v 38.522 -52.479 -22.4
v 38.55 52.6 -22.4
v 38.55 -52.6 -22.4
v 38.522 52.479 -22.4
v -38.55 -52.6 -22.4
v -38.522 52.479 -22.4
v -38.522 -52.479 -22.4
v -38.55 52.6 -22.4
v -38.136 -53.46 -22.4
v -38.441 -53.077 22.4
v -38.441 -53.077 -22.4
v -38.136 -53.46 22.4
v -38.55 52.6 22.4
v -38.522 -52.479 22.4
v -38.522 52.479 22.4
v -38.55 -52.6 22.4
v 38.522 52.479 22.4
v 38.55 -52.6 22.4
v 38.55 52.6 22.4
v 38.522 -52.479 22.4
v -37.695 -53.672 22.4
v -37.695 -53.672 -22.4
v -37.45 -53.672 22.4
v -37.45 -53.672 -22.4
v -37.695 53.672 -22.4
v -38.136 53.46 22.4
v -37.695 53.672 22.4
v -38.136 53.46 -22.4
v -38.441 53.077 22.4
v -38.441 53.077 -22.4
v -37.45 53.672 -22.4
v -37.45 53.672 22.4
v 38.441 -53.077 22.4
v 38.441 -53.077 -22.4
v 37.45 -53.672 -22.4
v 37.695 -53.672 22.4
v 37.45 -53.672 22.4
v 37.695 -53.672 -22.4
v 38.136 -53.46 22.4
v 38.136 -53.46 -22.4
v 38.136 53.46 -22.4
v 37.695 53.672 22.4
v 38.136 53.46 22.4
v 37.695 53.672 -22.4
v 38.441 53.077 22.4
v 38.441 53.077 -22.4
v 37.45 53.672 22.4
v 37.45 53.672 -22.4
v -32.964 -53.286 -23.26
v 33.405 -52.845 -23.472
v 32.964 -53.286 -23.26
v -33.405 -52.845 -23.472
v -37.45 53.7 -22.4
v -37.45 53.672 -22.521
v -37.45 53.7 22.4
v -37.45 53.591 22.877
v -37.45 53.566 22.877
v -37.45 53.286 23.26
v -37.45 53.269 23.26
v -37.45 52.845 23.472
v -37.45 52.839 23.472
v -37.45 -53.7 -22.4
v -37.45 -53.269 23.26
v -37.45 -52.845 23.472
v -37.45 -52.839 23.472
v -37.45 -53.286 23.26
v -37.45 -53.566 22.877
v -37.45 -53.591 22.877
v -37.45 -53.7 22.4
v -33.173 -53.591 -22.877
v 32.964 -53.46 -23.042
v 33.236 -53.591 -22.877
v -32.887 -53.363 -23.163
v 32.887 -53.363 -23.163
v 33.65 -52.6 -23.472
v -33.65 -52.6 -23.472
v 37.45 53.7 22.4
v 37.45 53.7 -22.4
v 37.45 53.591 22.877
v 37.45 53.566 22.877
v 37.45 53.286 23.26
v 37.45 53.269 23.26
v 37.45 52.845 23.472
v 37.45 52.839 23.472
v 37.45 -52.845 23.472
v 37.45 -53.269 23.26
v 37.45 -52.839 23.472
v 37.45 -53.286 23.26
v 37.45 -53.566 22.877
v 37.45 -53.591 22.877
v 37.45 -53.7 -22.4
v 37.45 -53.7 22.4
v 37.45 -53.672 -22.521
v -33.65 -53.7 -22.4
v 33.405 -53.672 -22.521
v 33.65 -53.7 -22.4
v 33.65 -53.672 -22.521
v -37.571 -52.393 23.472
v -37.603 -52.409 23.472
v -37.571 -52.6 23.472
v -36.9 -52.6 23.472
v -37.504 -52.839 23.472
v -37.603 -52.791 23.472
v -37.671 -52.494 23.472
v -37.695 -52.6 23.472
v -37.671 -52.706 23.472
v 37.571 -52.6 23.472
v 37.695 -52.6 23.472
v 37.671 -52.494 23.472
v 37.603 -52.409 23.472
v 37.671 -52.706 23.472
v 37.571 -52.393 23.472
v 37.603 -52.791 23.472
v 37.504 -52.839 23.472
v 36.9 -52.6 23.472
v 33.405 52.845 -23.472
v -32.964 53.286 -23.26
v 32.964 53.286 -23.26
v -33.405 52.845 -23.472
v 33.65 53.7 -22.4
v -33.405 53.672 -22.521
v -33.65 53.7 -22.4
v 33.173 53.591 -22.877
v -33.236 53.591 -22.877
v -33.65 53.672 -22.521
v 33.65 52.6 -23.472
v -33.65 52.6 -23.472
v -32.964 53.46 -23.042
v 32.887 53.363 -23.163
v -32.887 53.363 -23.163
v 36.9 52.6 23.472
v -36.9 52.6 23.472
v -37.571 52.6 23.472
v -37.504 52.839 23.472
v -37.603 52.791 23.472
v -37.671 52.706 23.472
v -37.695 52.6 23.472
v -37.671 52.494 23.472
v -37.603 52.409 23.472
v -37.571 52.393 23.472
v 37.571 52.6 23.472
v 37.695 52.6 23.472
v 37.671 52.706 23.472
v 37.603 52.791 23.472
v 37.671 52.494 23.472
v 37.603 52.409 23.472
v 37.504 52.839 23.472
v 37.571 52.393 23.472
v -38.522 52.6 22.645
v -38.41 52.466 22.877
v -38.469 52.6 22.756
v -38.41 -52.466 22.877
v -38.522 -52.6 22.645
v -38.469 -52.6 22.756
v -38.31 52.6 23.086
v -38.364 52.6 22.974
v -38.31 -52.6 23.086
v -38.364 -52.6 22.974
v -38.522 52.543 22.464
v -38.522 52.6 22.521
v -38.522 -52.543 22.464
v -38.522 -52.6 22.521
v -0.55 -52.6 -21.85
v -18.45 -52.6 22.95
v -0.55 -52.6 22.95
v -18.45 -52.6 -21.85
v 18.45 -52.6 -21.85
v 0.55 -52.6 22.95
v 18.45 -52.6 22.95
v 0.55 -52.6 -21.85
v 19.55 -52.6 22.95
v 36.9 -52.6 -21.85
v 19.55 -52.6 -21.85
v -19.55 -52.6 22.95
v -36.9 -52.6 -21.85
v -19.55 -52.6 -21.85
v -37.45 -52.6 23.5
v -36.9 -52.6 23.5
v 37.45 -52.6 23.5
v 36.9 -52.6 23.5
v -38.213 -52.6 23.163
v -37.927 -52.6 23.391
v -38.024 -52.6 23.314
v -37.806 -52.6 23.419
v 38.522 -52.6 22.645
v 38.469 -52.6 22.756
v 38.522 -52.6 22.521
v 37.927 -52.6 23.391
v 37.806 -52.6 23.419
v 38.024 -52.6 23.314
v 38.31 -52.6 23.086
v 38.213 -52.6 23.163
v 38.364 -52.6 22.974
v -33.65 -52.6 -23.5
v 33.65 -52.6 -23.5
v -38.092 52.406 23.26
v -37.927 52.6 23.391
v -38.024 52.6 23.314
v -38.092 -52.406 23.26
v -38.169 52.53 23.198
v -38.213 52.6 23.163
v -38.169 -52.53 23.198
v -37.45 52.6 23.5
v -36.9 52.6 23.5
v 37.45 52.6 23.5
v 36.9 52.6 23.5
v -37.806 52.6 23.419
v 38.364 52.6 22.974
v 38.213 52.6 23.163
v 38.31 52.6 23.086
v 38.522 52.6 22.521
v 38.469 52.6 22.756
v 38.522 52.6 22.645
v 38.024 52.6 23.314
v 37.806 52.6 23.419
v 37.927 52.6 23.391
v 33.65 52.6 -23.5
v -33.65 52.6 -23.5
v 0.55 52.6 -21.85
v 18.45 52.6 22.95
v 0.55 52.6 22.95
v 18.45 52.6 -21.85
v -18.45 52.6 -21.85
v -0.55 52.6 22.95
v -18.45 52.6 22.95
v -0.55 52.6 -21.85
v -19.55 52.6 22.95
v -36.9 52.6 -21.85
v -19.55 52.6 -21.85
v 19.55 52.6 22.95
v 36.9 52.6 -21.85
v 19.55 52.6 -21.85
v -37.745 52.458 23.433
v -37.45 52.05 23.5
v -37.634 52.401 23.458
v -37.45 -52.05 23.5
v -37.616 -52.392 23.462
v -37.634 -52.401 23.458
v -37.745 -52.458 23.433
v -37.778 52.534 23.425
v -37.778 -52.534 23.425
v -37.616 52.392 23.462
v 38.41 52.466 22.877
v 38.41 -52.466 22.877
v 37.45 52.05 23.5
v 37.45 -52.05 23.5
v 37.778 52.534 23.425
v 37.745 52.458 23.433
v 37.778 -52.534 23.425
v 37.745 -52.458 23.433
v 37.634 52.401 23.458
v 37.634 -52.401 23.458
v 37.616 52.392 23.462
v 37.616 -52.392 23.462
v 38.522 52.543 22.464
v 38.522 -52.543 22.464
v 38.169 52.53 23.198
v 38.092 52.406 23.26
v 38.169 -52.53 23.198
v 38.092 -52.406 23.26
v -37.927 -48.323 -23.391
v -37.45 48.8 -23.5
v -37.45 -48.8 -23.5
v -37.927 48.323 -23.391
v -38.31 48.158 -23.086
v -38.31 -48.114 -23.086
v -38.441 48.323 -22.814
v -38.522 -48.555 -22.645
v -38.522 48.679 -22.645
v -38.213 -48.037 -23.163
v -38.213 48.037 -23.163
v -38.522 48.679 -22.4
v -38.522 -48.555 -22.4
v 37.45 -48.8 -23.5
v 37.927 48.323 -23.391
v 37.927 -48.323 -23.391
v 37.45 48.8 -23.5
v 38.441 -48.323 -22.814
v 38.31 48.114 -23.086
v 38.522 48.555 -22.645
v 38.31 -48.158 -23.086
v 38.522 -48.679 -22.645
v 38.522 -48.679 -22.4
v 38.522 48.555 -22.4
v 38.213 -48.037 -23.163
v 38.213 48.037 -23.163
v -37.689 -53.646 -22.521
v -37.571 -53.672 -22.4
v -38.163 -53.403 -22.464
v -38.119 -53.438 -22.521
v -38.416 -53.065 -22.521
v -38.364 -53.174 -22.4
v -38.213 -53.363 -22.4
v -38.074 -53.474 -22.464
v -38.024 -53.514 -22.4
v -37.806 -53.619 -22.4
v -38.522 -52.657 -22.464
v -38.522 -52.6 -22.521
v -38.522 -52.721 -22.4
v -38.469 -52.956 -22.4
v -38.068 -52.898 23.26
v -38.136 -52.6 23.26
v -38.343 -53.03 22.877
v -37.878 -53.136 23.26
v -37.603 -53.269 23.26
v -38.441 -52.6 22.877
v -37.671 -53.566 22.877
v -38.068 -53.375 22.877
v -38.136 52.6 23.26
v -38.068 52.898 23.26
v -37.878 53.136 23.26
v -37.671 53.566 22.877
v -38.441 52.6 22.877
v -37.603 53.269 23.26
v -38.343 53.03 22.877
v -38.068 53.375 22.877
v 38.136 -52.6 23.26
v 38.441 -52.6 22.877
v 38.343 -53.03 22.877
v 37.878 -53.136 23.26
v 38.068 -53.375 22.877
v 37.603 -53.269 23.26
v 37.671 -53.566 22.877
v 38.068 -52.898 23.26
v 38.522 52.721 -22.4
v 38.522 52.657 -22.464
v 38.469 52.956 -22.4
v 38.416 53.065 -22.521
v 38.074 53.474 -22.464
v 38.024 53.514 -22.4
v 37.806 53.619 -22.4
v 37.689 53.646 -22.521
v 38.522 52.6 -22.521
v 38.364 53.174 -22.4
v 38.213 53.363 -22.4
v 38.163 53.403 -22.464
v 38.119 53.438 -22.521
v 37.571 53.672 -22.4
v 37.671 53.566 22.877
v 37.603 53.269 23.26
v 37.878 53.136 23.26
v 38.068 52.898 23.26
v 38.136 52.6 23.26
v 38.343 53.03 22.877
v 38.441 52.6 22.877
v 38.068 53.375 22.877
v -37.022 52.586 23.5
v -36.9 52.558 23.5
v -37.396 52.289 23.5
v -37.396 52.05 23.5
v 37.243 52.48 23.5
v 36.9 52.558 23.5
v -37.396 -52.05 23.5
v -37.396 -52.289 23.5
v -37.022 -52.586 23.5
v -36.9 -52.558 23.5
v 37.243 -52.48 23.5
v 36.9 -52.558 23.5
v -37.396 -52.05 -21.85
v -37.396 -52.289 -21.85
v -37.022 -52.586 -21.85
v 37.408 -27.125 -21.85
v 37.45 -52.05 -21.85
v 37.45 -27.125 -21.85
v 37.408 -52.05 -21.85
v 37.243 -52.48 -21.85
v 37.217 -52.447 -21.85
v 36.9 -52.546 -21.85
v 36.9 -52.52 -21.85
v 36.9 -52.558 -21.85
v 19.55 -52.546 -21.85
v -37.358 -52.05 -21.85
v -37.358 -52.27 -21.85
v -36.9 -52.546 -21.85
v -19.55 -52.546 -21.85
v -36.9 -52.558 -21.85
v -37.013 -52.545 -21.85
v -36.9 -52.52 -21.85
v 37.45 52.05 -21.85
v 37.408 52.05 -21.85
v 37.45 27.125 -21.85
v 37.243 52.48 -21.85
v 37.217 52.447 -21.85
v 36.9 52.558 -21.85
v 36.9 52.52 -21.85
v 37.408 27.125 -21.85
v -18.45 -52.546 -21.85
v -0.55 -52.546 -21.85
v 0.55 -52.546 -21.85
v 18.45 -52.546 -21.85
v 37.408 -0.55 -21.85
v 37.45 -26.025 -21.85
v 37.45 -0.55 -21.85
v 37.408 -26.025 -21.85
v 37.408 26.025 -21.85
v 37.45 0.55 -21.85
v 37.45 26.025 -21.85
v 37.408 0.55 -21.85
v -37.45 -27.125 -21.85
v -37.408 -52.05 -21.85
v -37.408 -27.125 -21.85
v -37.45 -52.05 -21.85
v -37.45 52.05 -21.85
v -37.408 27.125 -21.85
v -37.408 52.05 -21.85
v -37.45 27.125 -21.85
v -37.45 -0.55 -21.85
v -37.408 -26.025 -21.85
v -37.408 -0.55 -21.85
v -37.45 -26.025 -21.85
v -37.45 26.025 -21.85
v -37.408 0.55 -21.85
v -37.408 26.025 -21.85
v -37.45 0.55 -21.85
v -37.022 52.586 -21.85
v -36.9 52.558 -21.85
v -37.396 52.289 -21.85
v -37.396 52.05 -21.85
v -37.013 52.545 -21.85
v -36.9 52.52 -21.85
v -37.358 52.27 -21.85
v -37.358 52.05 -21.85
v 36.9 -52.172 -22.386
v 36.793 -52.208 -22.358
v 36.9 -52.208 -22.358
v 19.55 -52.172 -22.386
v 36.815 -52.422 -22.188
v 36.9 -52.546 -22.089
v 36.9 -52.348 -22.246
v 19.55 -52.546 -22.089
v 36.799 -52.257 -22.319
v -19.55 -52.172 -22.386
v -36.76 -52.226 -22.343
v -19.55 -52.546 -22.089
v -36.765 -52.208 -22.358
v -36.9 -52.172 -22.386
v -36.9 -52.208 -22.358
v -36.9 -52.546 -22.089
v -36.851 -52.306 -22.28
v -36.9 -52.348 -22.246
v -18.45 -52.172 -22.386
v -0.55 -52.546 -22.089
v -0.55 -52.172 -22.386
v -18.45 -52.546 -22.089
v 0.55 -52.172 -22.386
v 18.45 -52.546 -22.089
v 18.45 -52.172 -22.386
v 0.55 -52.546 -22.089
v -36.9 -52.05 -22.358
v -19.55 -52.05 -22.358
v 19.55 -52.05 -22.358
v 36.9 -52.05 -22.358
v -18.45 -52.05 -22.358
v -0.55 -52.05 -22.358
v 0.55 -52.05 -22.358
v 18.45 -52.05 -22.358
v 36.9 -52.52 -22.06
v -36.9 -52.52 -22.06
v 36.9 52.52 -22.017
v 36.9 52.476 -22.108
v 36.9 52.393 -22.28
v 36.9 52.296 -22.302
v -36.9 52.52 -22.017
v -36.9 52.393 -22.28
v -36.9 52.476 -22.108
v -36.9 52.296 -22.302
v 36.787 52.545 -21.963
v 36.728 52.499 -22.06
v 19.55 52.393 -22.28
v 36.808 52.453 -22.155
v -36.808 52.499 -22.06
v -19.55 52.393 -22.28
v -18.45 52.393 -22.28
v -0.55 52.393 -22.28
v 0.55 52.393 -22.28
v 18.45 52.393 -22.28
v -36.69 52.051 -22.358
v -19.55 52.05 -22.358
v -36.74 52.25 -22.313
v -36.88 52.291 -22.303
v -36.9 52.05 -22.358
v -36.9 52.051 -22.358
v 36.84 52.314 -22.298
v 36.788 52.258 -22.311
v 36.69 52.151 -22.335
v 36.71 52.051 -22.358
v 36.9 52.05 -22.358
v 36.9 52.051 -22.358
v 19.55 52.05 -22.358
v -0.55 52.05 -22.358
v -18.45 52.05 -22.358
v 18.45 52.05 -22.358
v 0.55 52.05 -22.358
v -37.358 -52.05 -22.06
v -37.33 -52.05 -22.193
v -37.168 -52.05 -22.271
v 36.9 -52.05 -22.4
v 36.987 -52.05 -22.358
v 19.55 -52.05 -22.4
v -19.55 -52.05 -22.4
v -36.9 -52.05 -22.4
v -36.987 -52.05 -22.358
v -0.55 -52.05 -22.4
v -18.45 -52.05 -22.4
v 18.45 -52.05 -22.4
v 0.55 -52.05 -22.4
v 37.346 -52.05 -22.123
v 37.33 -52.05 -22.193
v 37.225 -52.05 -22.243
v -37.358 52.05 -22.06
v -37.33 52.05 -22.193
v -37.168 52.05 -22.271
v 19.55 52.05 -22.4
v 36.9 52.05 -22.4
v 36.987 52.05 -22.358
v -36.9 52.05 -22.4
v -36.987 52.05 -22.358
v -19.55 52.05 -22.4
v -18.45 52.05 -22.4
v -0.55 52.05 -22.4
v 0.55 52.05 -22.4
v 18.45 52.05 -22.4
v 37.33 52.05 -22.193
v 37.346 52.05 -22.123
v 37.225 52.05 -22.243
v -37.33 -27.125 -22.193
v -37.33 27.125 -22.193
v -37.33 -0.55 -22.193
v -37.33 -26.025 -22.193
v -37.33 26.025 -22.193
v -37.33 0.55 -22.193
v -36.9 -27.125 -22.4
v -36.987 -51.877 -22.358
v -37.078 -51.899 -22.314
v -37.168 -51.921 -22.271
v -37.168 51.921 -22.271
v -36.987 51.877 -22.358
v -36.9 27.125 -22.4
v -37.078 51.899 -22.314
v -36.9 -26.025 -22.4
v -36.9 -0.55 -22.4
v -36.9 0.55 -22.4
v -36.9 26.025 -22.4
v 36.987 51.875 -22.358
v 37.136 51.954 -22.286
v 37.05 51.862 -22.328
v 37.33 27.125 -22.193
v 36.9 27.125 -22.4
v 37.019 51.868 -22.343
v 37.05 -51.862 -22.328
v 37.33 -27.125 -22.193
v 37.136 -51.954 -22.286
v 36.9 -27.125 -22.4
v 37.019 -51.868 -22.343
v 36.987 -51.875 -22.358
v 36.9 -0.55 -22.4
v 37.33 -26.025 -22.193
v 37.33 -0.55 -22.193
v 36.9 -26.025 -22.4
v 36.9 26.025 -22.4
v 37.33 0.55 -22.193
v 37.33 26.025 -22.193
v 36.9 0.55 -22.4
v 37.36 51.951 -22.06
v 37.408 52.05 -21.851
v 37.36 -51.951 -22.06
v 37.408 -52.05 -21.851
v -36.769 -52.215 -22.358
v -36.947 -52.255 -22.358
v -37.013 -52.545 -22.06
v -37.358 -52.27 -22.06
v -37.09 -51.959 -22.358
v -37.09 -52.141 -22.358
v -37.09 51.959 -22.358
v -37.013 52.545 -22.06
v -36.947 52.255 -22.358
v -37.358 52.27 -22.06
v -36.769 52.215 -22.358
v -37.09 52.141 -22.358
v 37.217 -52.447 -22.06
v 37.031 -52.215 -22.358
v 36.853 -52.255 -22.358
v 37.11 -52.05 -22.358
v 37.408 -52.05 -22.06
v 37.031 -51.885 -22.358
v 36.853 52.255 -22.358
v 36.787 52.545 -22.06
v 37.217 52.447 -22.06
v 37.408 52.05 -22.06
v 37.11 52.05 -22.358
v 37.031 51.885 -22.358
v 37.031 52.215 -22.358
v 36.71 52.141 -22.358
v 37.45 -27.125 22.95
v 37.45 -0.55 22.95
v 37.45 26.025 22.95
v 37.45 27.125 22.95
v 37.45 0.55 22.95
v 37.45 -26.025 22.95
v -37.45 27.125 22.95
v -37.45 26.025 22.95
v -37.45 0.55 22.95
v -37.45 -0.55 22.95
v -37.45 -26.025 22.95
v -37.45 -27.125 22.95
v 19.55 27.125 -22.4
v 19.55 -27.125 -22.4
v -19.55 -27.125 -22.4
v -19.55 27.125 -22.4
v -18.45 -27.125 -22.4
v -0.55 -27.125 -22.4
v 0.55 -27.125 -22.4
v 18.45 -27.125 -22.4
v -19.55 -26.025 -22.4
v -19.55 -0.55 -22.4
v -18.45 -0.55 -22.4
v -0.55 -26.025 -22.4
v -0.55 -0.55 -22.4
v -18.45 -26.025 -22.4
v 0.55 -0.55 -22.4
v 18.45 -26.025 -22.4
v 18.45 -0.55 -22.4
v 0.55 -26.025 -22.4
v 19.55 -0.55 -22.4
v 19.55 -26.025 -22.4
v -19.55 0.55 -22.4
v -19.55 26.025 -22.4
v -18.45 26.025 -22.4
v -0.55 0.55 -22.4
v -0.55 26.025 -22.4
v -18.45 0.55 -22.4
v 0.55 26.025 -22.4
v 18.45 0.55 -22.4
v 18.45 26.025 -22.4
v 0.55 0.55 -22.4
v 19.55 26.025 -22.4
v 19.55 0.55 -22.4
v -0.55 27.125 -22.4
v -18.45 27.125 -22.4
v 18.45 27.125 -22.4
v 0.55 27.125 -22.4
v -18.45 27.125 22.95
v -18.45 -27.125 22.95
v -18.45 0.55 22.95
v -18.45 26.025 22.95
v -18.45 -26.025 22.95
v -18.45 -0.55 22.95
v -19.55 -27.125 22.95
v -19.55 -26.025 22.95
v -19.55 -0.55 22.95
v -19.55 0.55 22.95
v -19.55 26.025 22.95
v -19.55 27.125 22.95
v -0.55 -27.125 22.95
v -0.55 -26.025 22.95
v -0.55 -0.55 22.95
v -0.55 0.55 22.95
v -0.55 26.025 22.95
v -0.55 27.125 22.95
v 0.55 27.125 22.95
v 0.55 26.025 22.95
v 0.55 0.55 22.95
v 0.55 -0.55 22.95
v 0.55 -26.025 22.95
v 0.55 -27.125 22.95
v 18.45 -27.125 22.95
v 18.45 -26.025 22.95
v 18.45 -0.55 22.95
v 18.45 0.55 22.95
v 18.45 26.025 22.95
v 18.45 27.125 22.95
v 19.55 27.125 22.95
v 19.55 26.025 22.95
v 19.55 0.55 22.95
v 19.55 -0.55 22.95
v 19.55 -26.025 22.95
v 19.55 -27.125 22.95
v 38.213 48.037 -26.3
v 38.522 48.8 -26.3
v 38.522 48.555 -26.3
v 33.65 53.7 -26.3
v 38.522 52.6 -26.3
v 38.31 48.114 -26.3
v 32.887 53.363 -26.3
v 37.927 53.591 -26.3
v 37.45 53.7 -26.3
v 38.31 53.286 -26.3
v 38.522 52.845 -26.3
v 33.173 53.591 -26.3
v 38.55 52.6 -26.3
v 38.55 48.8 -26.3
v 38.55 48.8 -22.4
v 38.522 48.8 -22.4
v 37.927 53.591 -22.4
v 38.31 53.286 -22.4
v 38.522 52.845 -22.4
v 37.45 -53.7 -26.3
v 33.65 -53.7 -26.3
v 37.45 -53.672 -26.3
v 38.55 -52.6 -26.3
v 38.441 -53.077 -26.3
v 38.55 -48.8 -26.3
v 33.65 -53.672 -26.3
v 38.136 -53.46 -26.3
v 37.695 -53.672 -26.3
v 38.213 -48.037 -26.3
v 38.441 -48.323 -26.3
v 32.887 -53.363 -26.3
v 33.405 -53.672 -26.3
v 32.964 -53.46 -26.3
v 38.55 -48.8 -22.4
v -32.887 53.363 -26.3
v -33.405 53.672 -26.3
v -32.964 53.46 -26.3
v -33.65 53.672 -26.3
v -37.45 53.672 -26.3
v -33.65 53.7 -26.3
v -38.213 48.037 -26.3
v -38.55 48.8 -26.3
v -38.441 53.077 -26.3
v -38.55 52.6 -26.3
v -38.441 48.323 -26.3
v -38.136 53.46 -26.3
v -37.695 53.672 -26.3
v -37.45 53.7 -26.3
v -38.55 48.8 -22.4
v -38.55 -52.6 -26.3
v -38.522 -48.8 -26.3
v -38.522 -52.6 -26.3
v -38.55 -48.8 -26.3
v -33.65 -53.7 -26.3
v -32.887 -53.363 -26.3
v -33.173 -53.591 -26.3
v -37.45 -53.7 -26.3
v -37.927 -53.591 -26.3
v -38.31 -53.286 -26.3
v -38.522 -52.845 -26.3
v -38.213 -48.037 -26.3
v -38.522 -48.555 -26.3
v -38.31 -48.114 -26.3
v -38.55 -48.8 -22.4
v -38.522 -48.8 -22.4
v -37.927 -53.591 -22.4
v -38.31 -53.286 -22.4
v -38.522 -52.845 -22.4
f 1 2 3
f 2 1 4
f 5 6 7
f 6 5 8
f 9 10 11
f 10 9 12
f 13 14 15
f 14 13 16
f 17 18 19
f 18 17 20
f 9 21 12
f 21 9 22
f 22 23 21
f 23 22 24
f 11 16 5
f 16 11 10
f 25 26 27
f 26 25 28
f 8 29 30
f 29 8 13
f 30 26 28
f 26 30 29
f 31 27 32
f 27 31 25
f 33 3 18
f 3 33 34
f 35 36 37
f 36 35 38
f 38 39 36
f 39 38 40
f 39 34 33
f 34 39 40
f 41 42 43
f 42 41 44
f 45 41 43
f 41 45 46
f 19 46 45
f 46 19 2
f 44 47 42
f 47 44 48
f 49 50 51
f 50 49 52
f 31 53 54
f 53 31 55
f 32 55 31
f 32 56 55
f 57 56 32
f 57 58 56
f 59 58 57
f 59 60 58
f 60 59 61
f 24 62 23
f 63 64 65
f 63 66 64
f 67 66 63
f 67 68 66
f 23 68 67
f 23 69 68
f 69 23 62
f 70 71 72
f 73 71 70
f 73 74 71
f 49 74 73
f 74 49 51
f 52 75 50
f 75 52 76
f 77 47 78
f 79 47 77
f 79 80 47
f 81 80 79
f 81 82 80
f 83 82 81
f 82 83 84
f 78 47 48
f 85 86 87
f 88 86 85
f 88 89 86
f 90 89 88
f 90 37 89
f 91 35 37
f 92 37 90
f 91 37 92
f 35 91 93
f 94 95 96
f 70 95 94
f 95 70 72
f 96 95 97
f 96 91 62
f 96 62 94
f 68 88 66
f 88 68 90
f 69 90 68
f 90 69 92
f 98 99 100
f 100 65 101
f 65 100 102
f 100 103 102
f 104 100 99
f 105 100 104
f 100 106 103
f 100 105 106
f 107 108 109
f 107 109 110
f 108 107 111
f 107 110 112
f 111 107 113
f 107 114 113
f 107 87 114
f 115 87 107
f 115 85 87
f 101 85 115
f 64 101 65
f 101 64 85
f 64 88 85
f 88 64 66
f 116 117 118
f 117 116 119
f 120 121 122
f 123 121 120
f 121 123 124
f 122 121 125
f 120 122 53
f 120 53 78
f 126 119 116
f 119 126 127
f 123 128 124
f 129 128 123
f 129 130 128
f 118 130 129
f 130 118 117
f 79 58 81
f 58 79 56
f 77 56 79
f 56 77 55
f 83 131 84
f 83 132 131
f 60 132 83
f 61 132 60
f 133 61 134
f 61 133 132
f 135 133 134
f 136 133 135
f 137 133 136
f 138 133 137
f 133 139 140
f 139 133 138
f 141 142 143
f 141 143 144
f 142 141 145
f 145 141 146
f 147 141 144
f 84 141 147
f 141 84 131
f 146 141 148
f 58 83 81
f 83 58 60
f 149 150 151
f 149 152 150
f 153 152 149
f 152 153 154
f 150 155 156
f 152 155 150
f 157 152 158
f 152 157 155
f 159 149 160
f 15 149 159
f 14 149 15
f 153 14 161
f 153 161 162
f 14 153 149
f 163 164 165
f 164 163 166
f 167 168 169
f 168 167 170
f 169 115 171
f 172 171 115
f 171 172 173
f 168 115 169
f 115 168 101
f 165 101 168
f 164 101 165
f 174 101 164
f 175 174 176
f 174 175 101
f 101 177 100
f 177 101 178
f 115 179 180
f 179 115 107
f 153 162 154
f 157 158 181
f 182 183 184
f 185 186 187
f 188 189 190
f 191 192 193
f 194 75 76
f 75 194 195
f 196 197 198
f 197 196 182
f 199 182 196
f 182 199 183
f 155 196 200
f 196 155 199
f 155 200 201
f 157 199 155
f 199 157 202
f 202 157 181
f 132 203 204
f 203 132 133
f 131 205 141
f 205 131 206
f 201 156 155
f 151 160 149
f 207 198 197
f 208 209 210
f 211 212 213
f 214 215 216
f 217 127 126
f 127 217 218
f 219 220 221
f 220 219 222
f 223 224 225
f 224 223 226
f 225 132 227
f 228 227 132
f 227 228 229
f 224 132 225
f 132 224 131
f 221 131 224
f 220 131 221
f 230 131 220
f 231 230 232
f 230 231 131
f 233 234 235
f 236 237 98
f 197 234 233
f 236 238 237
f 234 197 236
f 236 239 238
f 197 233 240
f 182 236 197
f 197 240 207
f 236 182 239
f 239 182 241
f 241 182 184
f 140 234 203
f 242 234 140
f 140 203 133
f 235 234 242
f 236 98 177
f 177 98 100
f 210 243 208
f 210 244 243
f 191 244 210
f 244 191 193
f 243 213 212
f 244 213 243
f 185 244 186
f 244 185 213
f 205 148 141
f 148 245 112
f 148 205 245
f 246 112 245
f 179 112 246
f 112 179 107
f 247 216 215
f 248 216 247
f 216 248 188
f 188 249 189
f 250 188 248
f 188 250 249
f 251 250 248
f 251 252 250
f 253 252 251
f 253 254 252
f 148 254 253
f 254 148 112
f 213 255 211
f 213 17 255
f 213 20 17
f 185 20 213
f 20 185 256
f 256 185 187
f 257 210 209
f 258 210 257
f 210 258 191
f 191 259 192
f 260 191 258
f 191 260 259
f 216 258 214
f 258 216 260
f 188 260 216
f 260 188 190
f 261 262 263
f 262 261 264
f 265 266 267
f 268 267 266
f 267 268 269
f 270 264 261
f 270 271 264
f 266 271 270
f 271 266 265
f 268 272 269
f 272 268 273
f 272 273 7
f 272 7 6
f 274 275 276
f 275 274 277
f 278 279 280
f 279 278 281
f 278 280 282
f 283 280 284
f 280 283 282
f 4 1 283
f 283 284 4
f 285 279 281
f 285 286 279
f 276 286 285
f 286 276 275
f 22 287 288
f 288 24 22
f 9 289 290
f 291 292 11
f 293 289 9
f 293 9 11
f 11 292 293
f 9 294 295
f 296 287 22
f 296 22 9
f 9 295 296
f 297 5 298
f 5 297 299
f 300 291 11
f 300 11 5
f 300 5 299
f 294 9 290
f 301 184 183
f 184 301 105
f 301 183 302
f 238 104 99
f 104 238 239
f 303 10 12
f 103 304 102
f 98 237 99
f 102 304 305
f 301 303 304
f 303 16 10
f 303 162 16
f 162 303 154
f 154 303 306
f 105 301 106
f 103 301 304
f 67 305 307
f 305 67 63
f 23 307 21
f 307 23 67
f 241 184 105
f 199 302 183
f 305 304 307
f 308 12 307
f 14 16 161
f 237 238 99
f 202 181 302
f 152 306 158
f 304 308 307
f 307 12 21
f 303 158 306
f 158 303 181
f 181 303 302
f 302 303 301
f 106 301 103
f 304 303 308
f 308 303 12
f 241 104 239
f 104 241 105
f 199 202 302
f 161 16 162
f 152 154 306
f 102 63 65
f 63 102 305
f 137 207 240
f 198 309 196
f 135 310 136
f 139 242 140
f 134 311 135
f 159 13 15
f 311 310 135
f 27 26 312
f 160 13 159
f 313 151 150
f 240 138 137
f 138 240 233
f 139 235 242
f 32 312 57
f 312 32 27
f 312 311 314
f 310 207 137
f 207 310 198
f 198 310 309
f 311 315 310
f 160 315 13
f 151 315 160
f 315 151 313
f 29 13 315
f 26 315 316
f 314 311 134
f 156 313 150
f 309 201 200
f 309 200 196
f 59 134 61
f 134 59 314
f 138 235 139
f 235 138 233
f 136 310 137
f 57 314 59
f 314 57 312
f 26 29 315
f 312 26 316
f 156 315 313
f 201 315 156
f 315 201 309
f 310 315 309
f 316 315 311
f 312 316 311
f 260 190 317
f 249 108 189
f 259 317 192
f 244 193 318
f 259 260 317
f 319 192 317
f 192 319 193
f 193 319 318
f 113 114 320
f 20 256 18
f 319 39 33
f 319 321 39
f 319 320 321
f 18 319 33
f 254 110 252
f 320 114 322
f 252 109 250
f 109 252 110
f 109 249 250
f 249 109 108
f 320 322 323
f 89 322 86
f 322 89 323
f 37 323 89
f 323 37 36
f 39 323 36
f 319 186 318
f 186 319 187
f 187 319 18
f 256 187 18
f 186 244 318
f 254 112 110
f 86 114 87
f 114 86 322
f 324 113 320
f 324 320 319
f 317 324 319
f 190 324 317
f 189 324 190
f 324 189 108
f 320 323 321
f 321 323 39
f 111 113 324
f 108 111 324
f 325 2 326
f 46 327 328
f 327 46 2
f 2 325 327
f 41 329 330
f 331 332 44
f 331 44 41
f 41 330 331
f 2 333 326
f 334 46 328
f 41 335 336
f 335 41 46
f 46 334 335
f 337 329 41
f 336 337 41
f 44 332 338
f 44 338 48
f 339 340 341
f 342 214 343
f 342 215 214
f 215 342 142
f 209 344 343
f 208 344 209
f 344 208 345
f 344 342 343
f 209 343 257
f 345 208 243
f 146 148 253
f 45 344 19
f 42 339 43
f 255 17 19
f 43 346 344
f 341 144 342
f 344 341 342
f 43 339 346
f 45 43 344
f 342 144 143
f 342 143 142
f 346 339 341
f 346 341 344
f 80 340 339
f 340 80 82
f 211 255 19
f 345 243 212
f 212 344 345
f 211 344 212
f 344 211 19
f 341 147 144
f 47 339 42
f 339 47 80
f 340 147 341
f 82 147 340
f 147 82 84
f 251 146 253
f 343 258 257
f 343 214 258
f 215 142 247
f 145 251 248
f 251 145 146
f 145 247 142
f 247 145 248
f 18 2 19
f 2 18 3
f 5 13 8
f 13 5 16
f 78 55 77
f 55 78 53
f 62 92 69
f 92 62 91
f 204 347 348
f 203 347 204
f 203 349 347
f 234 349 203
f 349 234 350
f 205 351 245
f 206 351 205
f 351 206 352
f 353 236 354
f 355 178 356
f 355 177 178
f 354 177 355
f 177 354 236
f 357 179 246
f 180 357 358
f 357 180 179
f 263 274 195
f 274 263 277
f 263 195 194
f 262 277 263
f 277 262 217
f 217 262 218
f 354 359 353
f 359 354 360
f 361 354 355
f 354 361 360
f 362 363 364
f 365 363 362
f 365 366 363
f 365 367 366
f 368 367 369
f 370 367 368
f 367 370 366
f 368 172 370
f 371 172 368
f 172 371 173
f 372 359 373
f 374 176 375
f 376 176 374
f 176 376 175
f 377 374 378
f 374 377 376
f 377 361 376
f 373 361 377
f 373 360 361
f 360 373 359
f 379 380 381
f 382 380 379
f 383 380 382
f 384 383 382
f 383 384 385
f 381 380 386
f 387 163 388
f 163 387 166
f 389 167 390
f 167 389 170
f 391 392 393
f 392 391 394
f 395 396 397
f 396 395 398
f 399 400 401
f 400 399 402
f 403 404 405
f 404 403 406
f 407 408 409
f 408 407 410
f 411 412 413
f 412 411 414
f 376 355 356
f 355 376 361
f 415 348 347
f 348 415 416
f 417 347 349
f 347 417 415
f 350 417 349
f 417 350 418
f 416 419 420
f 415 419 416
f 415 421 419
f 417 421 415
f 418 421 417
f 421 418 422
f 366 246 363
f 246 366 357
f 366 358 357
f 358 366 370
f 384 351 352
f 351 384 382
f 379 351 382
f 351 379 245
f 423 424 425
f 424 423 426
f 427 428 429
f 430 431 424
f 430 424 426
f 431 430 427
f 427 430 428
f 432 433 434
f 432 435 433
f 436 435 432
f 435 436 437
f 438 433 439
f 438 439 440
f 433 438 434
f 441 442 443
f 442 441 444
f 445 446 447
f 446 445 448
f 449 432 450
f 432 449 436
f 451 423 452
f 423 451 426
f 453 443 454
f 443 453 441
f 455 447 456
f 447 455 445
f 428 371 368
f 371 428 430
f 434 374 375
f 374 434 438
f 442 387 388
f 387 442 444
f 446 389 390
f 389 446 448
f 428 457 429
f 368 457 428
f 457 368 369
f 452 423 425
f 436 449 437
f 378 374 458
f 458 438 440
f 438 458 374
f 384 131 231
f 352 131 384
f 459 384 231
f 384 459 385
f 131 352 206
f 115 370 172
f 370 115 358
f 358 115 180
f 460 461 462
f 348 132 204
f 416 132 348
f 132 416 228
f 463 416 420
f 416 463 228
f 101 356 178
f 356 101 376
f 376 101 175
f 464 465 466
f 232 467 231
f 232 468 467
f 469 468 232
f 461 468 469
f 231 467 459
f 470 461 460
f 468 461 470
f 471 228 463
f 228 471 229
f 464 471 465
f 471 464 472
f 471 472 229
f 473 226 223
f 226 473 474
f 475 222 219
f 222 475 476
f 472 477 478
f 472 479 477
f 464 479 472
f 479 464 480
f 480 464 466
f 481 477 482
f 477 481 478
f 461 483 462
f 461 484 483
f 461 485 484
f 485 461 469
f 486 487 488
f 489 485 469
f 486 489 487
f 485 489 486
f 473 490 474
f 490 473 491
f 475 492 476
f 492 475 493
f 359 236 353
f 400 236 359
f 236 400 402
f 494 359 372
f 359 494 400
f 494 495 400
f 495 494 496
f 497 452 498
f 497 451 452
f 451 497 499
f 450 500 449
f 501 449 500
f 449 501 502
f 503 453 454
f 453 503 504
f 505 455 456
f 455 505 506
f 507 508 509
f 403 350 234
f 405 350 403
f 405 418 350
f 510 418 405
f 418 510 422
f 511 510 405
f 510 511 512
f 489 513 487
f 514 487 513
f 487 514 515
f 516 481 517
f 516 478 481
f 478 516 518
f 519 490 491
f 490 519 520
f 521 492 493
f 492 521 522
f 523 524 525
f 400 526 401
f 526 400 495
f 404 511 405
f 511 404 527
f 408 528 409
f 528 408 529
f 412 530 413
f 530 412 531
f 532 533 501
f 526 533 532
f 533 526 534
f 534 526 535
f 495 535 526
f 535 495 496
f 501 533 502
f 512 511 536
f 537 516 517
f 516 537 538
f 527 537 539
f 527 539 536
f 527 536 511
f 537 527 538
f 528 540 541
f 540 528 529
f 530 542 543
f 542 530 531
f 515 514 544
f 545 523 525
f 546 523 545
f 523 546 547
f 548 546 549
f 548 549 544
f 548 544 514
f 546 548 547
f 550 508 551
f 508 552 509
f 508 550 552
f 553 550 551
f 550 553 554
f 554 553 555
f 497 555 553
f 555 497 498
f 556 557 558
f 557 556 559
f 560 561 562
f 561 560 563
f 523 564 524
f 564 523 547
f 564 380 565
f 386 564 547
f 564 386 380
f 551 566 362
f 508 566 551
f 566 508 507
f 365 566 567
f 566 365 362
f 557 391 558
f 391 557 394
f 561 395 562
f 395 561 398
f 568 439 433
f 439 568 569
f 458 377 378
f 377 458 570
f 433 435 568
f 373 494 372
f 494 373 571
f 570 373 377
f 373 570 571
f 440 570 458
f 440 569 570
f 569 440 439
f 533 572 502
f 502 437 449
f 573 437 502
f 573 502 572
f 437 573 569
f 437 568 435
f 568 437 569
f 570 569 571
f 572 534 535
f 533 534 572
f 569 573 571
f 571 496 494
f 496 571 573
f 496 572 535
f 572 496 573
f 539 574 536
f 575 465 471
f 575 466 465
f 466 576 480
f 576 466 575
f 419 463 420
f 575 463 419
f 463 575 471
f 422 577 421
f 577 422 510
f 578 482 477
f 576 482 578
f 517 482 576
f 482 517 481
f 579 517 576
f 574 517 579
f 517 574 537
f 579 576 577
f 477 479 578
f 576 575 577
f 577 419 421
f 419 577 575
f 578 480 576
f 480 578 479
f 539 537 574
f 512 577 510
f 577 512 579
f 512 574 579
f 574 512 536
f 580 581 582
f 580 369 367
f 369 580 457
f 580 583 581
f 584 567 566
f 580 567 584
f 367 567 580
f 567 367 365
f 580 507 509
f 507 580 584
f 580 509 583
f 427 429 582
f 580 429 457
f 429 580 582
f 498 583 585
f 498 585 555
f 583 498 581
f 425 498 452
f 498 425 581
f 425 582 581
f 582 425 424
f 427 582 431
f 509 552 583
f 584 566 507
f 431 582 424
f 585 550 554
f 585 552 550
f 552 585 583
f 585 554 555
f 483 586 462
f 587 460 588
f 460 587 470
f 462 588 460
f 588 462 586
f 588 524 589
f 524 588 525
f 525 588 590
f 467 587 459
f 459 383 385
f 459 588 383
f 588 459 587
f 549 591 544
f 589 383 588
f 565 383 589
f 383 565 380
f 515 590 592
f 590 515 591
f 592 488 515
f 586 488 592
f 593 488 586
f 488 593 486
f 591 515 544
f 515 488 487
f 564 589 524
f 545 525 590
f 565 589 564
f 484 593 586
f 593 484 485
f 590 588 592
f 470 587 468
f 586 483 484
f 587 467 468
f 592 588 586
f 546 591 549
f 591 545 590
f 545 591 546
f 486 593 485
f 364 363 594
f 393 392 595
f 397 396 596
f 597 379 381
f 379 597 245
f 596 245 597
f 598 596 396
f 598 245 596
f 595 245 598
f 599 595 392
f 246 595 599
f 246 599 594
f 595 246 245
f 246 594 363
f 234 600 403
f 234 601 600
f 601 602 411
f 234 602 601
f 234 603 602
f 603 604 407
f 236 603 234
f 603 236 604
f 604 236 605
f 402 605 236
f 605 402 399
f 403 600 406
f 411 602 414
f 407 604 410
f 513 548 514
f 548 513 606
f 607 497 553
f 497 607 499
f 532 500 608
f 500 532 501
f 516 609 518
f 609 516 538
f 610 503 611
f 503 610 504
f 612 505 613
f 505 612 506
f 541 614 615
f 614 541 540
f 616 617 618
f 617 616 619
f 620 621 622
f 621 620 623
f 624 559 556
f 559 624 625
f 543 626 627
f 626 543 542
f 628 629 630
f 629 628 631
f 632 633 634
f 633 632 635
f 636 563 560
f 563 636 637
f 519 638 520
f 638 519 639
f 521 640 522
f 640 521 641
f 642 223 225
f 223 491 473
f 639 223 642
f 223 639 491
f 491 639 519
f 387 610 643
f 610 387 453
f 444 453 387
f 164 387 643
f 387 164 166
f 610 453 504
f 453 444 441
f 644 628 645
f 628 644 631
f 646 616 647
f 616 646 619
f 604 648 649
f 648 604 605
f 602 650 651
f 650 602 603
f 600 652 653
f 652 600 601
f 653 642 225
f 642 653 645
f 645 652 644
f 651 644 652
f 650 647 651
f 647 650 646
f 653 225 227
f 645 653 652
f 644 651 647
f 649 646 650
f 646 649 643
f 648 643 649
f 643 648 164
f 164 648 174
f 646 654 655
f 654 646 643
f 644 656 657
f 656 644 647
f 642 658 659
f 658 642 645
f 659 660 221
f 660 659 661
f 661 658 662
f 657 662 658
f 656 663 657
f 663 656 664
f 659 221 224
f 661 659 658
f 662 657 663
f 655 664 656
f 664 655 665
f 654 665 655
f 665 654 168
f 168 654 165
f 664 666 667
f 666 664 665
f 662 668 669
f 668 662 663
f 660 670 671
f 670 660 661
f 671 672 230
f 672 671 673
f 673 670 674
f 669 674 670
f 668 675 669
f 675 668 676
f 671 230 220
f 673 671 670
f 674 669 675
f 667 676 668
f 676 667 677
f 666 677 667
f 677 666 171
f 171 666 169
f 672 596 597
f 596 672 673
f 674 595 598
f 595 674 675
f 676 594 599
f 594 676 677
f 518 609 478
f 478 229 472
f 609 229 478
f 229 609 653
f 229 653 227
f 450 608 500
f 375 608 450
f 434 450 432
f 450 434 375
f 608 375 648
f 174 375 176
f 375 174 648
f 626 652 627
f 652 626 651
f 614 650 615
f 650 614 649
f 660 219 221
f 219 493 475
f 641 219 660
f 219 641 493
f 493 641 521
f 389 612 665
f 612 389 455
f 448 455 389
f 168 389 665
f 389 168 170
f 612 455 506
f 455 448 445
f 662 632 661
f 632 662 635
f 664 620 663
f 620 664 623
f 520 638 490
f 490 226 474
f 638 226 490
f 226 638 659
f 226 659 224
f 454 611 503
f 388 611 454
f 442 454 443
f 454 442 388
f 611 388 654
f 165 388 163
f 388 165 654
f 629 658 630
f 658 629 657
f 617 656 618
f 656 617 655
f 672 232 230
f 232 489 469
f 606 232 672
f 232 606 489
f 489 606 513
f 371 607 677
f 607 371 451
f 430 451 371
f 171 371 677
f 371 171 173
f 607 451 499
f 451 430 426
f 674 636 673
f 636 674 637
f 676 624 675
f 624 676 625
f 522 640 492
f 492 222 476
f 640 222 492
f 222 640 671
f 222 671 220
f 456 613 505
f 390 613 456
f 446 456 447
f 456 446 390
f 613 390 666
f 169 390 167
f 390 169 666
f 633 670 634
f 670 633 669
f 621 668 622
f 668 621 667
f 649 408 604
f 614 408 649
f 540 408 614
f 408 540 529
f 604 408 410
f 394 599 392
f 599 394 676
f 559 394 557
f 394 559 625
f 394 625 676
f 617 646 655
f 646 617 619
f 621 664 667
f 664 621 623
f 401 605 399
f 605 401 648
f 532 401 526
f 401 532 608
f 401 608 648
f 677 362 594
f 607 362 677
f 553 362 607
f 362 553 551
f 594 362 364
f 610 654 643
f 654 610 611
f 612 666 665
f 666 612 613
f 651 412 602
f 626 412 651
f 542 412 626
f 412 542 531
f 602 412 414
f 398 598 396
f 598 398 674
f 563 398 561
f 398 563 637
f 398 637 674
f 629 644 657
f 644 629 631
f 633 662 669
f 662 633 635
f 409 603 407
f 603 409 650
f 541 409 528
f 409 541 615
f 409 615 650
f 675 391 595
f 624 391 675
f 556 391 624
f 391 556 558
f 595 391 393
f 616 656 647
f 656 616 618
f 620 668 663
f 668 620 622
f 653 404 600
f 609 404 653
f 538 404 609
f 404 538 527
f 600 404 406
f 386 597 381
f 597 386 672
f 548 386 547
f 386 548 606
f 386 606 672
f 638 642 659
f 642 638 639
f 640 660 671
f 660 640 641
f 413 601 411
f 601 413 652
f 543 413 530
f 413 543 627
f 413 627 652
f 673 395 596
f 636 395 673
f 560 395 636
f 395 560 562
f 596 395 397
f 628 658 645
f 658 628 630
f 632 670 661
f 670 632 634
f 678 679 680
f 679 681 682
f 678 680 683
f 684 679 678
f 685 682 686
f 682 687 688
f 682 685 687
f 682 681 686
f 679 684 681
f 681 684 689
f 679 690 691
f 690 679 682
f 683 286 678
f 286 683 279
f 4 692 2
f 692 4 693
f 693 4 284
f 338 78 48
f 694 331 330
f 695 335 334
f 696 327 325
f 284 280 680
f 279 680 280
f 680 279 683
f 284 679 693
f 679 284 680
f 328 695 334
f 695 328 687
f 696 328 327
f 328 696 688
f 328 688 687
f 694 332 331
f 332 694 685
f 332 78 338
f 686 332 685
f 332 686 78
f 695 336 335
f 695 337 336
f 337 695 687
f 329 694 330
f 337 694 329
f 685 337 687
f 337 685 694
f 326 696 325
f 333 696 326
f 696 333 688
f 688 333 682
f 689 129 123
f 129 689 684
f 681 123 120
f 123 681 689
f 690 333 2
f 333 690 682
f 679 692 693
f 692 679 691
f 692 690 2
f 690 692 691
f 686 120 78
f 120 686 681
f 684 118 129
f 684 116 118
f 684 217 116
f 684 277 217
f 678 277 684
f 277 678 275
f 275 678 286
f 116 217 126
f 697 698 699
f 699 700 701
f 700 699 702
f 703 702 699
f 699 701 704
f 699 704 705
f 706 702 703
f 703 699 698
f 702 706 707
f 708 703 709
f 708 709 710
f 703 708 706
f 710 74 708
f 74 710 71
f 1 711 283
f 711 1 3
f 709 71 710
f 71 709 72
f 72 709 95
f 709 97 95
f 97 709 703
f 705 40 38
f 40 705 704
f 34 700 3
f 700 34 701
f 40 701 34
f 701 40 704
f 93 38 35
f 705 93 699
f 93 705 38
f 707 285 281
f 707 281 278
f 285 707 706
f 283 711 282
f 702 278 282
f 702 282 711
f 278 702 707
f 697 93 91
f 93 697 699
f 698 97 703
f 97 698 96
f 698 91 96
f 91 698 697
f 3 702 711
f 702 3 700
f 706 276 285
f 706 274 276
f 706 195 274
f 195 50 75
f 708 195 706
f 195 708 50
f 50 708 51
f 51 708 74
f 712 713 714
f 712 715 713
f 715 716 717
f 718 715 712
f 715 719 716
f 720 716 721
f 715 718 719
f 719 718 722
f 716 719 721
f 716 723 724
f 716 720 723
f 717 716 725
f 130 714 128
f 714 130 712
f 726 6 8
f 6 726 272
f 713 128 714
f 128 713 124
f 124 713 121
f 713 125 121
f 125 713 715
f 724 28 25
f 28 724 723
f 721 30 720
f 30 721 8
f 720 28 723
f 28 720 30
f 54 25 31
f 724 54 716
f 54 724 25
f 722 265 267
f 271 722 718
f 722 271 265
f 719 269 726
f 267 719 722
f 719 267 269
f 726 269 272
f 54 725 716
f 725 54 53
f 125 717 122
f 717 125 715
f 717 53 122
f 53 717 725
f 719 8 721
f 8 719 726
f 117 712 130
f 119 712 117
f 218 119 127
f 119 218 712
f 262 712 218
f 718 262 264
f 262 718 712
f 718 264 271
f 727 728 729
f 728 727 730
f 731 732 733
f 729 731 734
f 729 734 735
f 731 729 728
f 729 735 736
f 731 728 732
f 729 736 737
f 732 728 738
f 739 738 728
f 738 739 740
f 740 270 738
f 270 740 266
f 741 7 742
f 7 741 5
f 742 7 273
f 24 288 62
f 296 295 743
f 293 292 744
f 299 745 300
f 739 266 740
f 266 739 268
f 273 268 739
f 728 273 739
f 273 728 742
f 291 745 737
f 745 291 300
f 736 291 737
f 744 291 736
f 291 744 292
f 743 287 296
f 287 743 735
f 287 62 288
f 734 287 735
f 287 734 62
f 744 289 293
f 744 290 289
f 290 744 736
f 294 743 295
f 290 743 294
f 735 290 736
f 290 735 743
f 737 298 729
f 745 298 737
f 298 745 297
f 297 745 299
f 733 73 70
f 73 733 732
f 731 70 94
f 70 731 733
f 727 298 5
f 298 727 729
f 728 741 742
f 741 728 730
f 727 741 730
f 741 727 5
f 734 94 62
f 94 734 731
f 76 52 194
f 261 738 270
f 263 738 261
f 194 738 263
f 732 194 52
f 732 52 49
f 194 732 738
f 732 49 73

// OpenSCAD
use <MCAD/boxes.scad>

/* [Main] */

// Number of vertical "slots" in the case.
lines = 2; // [1,2,3,4,5]

// Number of horizontal "slots" in the case.
columns = 2; // [1,2,3,4,5,6,7,8,9,10]

vertical_dividers = 3; // [0,1,2,3,4,5,6,7,8,9,10]
horizontal_dividers = 3; // [0,1,2,3,4,5,6,7,8,9,10]

case_height = 47; // [47:Shallow, 46.2:Deep]

/* [Optional] */

skirt_size = 0;  // [0:50]

wall_thickness = 1.1;

/* [Hidden] */

$fa=0.5; // default minimum facet angle is now 0.5
$fs=0.5; // default minimum facet size is now 0.5 mm

single_box_width = 37.1;
single_box_height = 52.25;

double_box_width = 77.1;
double_box_height = 107.4;

round_radius = wall_thickness;

feet_height = 2.8;
feet_size = 6;

spacing_width = (double_box_width - single_box_width * 2);
spacing_height = (double_box_height - single_box_height * 2);

final_width = (single_box_width * columns) + (spacing_width * (columns - 1));
final_height = (single_box_height * lines) + (spacing_height * (lines - 1));

internal_width = final_width - 2 * wall_thickness;
internal_height = final_height - 2 * wall_thickness;

module feet() {
	translate([0,0,-(feet_height-round_radius)/2])
	difference() {
		union() {
			difference() {
				roundedBox([feet_size, feet_size, feet_height + round_radius], round_radius, sidesonly = true);
				rotate([0,0,45]) translate([-feet_size, 0, -feet_height]) cube([feet_size*2, feet_size, feet_height + 4]);
			}
		
			if (skirt_size > 0) {
				translate([0,0,-(feet_height + round_radius)/2]) cylinder(r = skirt_size, h = 0.3, center = false);
			}
		}
		if (skirt_size > 0) {
			translate([-skirt_size-1,0,-(feet_height + round_radius)/2-0.5]) cube([skirt_size+1, skirt_size+1, 1]);
		}
	}
}

difference() {
	roundedBox([final_width, final_height, case_height], round_radius);
	translate([0,0,wall_thickness+1]) roundedBox([final_width - 2 * wall_thickness, final_height - 2 * wall_thickness, case_height+2], round_radius/2);
}

vertical_spacing = (internal_width - (wall_thickness * vertical_dividers)) / (vertical_dividers + 1);
if (vertical_dividers > 0) {
	translate([-(internal_width - wall_thickness) / 2,0,0])
	for (i = [1:vertical_dividers]) {
		translate([vertical_spacing*i+wall_thickness * (i-1),0,0]) cube([wall_thickness, internal_height, case_height - wall_thickness], center = true);
	}
}

horizontal_spacing = (internal_height - (wall_thickness * horizontal_dividers)) / (horizontal_dividers + 1);
if (horizontal_dividers > 0) {
	translate([0,-(internal_height - wall_thickness) / 2,0])
	for (i = [1:horizontal_dividers]) {
		translate([0,horizontal_spacing*i+wall_thickness * (i-1),0]) cube([internal_width, wall_thickness, case_height - wall_thickness], center = true);
	}
}

for (x=[1, -1]) {
	for (y=[1, -1]) {
		translate([x * (final_width - feet_size) / 2, y * (final_height - feet_size) / 2, -case_height / 2]) rotate([0,0, (x==1 && y ==1 ? 90 : (x == -1 && y == 1 ? 180 : (x == -1 && y == -1 ? 270 : 0)))]) feet();
	}
}
